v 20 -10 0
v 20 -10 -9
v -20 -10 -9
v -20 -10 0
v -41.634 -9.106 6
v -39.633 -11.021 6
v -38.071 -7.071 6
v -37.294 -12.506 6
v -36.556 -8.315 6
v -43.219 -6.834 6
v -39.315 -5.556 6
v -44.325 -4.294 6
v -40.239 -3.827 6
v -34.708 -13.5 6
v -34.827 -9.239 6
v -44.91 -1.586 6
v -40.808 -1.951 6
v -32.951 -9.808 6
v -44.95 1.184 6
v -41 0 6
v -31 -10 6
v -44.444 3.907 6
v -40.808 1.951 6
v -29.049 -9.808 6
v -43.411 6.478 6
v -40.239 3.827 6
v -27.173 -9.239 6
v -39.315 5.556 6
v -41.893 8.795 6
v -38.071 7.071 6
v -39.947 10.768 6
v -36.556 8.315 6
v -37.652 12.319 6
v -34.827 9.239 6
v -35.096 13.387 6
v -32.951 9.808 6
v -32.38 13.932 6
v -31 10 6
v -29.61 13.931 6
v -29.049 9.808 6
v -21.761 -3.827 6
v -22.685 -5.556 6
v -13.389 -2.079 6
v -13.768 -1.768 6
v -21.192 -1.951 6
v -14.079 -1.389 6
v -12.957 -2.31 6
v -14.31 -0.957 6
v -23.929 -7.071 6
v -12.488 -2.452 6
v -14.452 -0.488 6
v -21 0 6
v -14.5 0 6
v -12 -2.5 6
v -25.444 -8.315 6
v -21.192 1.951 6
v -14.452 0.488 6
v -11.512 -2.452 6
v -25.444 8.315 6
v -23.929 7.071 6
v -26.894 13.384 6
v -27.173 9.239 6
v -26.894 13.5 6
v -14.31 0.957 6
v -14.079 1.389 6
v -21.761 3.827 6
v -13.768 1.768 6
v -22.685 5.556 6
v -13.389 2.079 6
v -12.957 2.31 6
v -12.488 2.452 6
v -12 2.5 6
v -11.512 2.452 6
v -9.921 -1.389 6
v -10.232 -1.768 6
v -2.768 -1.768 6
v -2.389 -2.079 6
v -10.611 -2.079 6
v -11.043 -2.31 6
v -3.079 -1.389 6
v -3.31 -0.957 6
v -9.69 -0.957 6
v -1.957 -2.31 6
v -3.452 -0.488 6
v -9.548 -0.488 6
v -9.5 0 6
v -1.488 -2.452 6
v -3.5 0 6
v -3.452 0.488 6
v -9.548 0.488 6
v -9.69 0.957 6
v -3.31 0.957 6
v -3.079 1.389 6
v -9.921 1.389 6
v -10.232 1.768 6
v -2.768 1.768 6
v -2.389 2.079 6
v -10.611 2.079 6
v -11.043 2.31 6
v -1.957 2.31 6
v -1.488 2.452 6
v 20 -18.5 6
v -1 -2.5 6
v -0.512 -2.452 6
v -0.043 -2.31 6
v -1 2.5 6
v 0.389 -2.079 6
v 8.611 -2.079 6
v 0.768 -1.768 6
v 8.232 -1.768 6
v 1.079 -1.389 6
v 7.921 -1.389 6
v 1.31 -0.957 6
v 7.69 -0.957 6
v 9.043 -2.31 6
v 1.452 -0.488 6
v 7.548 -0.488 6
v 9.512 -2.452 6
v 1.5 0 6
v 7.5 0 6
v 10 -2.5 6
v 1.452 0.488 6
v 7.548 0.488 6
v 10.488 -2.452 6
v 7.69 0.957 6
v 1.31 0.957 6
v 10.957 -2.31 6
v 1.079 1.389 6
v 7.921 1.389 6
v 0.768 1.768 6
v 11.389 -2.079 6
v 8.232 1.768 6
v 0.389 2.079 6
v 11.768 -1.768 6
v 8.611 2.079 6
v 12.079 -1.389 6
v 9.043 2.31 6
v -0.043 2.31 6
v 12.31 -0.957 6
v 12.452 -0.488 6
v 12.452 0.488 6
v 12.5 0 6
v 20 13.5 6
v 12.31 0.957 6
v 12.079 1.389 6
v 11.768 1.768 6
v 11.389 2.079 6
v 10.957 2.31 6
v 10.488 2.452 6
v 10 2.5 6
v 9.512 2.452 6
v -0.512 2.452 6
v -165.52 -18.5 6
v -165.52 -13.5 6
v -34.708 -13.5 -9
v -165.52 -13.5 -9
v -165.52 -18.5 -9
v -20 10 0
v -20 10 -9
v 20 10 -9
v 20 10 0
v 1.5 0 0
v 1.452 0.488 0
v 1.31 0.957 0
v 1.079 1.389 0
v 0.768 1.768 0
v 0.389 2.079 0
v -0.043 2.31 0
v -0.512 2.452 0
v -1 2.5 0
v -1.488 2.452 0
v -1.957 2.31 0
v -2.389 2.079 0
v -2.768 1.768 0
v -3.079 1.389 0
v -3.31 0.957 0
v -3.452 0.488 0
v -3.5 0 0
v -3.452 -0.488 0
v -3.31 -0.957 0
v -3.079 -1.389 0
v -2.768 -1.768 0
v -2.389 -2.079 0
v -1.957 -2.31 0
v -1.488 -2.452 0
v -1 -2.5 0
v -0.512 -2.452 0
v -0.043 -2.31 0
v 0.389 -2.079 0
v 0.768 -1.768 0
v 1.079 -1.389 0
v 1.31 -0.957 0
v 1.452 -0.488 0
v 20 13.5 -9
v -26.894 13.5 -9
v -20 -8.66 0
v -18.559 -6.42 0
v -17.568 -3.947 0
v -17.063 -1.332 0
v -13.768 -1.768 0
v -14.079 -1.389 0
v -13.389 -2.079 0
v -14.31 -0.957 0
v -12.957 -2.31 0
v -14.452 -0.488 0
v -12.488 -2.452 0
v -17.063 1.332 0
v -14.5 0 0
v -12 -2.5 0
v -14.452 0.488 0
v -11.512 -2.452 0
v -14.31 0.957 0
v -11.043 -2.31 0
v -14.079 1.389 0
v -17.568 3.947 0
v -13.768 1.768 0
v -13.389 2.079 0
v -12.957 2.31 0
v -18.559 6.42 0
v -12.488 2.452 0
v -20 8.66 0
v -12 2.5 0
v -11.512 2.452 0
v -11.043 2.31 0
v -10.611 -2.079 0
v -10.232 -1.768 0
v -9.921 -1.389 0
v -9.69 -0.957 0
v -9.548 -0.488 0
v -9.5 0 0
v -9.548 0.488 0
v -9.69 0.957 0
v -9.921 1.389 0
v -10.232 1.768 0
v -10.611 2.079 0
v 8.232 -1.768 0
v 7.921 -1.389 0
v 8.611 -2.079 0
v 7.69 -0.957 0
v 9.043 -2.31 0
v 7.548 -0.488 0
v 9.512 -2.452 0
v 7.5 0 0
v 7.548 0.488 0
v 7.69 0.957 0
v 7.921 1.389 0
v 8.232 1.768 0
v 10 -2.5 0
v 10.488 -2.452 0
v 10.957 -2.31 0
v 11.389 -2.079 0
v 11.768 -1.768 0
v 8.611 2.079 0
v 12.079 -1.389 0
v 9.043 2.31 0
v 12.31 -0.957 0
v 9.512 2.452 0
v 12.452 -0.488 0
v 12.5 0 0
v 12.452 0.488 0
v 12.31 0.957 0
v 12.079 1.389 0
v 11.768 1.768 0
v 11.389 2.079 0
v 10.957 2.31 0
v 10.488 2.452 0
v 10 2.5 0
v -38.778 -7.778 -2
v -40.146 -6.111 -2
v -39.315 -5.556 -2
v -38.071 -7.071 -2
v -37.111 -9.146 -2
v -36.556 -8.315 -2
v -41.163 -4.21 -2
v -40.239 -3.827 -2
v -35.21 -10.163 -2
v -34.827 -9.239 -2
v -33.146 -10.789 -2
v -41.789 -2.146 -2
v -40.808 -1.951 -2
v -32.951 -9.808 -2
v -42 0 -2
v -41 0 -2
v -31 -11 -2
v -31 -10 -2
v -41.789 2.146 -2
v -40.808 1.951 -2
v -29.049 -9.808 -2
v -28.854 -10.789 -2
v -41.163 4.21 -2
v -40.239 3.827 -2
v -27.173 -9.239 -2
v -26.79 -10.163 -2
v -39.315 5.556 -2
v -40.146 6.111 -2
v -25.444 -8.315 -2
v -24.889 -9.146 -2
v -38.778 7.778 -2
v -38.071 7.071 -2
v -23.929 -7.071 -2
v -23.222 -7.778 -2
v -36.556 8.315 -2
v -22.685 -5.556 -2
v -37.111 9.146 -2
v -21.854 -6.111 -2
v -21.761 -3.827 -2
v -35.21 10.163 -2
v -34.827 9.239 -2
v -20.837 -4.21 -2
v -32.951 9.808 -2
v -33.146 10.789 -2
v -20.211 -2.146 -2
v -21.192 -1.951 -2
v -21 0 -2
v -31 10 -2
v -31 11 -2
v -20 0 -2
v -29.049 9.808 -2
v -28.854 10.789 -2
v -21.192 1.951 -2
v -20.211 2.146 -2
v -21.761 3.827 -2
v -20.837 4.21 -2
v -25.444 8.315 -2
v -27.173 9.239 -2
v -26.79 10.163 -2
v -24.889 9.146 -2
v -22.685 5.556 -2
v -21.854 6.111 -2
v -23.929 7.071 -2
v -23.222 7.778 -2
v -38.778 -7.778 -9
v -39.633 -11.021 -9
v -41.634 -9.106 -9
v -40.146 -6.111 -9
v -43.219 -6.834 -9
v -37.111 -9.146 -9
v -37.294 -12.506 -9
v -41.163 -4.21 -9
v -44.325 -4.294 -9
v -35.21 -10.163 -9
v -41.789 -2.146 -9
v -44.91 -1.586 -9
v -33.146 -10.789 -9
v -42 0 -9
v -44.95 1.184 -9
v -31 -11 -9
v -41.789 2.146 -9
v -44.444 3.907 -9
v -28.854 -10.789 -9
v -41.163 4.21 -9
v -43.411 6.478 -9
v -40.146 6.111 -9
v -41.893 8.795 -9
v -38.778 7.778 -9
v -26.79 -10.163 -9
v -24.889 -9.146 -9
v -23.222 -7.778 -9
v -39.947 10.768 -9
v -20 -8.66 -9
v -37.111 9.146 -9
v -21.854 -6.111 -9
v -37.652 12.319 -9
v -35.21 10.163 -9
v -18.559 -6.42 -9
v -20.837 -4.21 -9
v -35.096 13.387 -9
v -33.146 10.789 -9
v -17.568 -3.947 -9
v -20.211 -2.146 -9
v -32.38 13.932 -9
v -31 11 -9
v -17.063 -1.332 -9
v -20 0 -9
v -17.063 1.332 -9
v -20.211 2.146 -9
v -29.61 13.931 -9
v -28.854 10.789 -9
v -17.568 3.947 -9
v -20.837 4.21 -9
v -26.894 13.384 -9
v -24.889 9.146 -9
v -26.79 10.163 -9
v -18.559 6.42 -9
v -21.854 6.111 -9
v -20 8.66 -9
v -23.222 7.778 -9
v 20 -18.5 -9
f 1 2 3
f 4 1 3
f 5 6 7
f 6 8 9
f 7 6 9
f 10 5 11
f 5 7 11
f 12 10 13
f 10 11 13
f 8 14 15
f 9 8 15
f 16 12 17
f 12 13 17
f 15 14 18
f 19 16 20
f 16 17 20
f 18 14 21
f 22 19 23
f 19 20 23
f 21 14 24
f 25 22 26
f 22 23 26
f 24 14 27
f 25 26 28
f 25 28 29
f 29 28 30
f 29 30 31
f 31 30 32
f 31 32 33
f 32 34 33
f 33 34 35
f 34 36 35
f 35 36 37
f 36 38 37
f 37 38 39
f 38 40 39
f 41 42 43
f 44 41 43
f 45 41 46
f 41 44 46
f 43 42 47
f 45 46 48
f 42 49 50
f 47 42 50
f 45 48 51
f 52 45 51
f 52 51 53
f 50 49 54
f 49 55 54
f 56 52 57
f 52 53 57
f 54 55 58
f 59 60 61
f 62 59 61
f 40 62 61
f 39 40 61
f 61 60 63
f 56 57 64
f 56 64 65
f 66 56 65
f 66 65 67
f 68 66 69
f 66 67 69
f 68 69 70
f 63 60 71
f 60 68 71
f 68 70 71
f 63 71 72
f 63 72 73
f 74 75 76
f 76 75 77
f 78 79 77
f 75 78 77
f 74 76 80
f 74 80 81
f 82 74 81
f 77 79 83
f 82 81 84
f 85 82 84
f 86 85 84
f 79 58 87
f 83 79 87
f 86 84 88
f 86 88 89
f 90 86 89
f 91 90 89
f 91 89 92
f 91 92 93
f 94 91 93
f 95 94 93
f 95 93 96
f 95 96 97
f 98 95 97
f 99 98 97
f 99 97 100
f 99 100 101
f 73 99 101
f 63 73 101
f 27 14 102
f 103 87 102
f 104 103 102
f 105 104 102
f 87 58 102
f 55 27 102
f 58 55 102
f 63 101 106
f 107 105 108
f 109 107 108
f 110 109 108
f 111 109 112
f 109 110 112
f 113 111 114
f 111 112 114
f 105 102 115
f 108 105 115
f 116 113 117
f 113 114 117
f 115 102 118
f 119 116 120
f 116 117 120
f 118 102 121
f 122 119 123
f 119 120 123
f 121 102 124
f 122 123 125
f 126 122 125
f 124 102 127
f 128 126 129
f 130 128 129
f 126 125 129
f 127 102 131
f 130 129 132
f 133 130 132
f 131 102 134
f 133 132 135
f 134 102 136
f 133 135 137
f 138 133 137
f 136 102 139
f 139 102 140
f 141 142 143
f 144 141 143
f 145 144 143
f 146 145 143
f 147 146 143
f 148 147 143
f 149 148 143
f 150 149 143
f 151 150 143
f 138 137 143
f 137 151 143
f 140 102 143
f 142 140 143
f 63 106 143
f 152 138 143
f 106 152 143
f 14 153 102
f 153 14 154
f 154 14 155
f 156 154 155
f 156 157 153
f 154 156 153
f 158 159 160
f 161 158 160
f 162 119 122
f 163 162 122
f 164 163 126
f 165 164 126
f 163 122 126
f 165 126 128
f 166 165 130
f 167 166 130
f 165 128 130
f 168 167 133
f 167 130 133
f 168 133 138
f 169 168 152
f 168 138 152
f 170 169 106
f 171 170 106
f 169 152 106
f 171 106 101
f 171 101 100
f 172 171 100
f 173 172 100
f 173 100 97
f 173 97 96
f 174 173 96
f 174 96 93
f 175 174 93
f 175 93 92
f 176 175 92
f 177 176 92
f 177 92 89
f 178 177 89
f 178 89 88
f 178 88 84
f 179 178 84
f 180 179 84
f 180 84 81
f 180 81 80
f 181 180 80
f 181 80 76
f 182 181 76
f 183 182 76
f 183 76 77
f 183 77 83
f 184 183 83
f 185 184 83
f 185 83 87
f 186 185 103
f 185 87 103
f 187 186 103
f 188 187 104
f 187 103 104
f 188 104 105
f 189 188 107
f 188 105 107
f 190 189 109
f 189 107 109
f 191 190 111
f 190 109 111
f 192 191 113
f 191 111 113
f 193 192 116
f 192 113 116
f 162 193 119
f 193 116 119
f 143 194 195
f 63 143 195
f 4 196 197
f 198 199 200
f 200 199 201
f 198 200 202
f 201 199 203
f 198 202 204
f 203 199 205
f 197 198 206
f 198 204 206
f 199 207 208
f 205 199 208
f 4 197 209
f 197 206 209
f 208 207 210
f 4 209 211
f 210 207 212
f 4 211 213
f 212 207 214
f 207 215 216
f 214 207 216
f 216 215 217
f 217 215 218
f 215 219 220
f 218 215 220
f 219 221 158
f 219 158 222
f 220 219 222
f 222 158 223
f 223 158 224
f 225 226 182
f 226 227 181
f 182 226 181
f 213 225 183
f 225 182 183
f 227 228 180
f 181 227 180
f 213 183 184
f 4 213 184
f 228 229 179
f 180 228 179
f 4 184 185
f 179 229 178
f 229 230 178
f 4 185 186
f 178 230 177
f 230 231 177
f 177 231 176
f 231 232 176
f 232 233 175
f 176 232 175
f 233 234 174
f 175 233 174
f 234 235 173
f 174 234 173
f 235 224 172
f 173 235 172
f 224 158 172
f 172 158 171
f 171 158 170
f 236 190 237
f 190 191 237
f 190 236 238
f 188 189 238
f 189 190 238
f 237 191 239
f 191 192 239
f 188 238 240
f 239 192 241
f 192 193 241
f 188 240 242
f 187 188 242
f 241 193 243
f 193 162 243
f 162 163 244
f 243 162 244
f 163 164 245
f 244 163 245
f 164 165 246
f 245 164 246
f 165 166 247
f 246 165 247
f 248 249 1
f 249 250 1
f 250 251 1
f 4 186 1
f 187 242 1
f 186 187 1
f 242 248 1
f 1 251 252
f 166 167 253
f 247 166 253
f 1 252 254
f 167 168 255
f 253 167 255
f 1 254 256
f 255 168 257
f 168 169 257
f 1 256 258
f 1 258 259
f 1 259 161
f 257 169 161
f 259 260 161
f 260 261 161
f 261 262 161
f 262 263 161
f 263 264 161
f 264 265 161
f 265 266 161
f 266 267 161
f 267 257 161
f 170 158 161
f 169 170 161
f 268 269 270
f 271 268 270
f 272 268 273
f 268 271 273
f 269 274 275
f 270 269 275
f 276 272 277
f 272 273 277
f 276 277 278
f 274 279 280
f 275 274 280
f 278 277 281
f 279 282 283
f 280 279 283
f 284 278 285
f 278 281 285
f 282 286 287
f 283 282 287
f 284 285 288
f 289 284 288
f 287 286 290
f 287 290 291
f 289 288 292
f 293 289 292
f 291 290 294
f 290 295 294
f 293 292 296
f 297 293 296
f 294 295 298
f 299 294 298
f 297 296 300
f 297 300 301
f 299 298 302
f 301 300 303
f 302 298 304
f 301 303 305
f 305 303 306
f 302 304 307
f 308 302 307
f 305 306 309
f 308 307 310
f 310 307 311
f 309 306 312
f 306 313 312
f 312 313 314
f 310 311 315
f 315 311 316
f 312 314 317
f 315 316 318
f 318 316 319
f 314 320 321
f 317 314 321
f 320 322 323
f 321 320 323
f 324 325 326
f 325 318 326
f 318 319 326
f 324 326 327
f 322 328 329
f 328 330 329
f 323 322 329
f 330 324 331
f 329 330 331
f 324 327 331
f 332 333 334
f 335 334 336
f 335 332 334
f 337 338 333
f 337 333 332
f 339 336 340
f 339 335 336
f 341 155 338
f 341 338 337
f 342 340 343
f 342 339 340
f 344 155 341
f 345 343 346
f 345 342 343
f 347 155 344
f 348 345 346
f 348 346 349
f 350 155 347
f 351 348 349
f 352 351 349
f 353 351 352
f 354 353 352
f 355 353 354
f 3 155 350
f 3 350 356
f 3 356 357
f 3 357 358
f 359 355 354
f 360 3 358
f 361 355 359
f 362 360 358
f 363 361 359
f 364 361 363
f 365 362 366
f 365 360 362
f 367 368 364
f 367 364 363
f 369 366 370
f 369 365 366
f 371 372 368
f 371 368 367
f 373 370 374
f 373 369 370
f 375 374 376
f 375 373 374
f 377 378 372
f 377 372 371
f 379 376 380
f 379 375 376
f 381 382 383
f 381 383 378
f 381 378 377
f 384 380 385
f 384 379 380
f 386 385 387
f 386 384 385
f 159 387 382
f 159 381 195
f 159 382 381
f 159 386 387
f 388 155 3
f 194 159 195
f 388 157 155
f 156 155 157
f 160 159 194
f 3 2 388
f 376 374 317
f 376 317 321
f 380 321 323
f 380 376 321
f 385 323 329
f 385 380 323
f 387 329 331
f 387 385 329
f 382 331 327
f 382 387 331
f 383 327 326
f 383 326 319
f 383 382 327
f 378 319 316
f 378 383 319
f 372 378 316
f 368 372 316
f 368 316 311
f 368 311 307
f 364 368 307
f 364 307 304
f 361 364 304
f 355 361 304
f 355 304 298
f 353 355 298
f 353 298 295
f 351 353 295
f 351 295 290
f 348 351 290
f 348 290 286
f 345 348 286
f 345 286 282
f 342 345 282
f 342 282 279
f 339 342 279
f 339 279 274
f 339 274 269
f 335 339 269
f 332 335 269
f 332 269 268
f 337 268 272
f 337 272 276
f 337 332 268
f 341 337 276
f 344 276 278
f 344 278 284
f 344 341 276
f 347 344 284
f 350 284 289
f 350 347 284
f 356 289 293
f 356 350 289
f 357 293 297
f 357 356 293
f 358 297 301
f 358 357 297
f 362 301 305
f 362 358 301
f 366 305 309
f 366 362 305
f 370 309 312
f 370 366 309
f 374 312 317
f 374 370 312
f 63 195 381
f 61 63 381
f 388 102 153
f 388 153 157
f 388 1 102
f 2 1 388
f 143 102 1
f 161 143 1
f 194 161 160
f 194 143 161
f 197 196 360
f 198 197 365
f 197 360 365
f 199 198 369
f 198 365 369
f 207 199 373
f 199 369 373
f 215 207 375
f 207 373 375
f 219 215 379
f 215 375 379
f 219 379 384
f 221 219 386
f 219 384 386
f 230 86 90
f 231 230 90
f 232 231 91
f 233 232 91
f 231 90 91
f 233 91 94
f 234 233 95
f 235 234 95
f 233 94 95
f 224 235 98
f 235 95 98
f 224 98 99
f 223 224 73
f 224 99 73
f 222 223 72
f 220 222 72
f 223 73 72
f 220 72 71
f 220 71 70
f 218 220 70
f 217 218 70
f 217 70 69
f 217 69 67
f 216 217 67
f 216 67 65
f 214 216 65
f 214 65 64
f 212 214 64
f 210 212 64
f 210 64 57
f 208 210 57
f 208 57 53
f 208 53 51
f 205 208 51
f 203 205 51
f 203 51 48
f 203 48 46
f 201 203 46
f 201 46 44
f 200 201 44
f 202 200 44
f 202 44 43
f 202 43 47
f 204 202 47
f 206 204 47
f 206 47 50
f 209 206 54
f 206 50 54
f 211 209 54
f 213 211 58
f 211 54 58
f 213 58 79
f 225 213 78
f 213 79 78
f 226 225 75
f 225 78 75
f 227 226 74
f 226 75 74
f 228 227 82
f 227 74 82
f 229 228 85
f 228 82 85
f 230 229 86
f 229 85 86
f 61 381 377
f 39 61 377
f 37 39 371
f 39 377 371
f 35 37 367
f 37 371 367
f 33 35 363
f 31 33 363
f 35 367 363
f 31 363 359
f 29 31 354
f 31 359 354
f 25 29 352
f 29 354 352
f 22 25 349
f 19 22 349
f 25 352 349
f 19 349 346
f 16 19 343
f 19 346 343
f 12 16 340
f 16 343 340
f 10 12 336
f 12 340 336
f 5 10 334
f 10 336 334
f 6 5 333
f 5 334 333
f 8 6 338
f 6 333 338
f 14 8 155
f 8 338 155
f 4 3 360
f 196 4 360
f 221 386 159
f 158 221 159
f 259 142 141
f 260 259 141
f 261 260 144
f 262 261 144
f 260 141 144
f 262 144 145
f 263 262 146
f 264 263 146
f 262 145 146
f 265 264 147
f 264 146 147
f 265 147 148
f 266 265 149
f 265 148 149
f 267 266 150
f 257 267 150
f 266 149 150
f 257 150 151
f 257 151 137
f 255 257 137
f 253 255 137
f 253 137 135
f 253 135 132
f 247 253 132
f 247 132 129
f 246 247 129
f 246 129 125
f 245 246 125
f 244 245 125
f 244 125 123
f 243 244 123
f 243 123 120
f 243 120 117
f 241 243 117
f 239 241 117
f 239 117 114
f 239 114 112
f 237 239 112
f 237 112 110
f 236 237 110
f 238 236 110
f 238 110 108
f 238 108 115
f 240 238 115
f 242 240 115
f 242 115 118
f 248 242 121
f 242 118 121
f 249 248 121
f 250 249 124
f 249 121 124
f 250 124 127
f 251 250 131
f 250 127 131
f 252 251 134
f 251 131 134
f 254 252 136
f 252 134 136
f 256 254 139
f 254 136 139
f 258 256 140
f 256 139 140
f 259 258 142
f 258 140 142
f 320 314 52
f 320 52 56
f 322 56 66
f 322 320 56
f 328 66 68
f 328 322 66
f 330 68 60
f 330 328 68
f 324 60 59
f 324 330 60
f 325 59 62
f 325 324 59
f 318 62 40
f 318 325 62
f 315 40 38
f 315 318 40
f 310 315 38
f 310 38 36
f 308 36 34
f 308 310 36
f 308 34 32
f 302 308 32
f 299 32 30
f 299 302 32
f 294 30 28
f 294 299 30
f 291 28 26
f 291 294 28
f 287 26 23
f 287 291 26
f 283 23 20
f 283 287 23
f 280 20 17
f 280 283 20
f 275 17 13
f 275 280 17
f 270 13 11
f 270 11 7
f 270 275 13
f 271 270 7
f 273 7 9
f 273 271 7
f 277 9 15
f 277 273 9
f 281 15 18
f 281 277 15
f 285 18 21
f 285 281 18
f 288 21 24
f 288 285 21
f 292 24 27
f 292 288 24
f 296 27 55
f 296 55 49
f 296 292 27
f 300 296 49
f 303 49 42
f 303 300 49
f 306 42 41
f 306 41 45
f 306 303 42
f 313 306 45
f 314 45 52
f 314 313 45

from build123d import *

# Parameters (mm, degrees)
SKETCH_1_W          = 40
SKETCH_1_H          = 20
EXTRUDE_1_DEPTH     = 6
SKETCH_2_R          = 2.5
CUT_EXTRUDE_1_DEPTH = 24.151673806
EXTRUDE_START       = -15
EXTRUDE_2_OUTLINE_R = 11
EXTRUDE_2_DEPTH     = 15
EXTRUDE_START_2     = -8
SKETCH_5_R          = 11
SKETCH_5_R_2        = 10
EXTRUDE_3_DEPTH     = 8
SKETCH_10_W         = 15
SKETCH_10_H         = 5
EXTRUDE_4_DEPTH     = 500
SKETCH_11_W         = 11.491200589
SKETCH_11_H         = 5.122583395
EXTRUDE_5_DEPTH     = 15
SKETCH_13_W         = 324.526705223
SKETCH_13_H         = 235.156452348
CUT_EXTRUDE_2_DEPTH = 482.183177179
SKETCH_14_W         = 2.170521585
SKETCH_14_H         = 5
CUT_EXTRUDE_3_DEPTH = 314.479535155


# Read off the part's stored shape, not the designer's step: 凸台-拉伸2
with BuildPart() as part:
    # 草图1 → 凸台-拉伸1 (new body)
    with BuildSketch(Plane.XY):
        Rectangle(SKETCH_1_W, SKETCH_1_H)
    extrude(amount=EXTRUDE_1_DEPTH)

    # 草图2 → 切除-拉伸1 (cut, through all)
    with BuildSketch(Plane.XY.offset(6)):
        with Locations((10, 0)):
            Circle(SKETCH_2_R)
        with Locations((-1, 0)):
            Circle(SKETCH_2_R)
        with Locations((-12, 0)):
            Circle(SKETCH_2_R)
    extrude(amount=-CUT_EXTRUDE_1_DEPTH, mode=Mode.SUBTRACT)

    # 凸台-拉伸2 outline → 凸台-拉伸2 (add)
    with BuildSketch(Plane.XY.offset(6).offset(EXTRUDE_START)):
        with BuildLine():
            Line((20, 10), (20, 13.5))
            Line((20, 13.5), (-26.893967141, 13.5))
            Line((-26.893967141, 13.5), (-26.893967141, 13.384337644))
            ThreePointArc((-26.893967141, 13.384337644), (-45, 0), (-26.893967141, -13.384337644))
            Line((-26.893967141, -13.384337644), (-26.893967141, -13.5))
            Line((-26.893967141, -13.5), (20, -13.5))
            Line((20, -13.5), (20, -10))
            Line((20, -10), (-20, -10))
            Line((-20, -10), (-20, -8.660254038))
            ThreePointArc((-20, -8.660254038), (-17, 0), (-20, 8.660254038))
            Line((-20, 8.660254038), (-20, 10))
            Line((-20, 10), (20, 10))
        make_face()
        with Locations((-31, 0)):
            Circle(EXTRUDE_2_OUTLINE_R, mode=Mode.SUBTRACT)
    extrude(amount=EXTRUDE_2_DEPTH)

    # 草图5 → 凸台-拉伸3 (add)
    with BuildSketch(Plane.XY.offset(6).offset(EXTRUDE_START_2)):
        with Locations((-31, 0)):
            Circle(SKETCH_5_R)
        with Locations((-31, 0)):
            Circle(SKETCH_5_R_2, mode=Mode.SUBTRACT)
    extrude(amount=EXTRUDE_3_DEPTH)

    # 草图10 → 凸台-拉伸4 (add)
    with BuildSketch(Plane(origin=(20, 0, 0), x_dir=(0, 0, -1), z_dir=(1, 0, 0))):
        with Locations((1.5, -16)):
            Rectangle(SKETCH_10_W, SKETCH_10_H)
    extrude(amount=-EXTRUDE_4_DEPTH)

    # 草图11 → 凸台-拉伸5 (add, through all)
    with BuildSketch(Plane(origin=(0, 0, -9), x_dir=(-1, 0, 0), z_dir=(0, 0, -1))):
        with Locations((27.78271332, -13.925059853)):
            Rectangle(SKETCH_11_W, SKETCH_11_H)
    extrude(amount=-EXTRUDE_5_DEPTH)

    # 草图13 → 切除-拉伸2 (cut, through all)
    with BuildSketch(Plane.XZ.offset(18.5)):
        with Locations((-327.783817457, -102.630695063)):
            Rectangle(SKETCH_13_W, SKETCH_13_H)
    extrude(amount=-CUT_EXTRUDE_2_DEPTH, mode=Mode.SUBTRACT)

    # 草图14 → 切除-拉伸3 (cut)
    with BuildSketch(Plane.ZY.offset(480)):
        with Locations((-7.914739208, -16)):
            Rectangle(SKETCH_14_W, SKETCH_14_H)
    extrude(amount=-CUT_EXTRUDE_3_DEPTH, mode=Mode.SUBTRACT)


solid = part.part
